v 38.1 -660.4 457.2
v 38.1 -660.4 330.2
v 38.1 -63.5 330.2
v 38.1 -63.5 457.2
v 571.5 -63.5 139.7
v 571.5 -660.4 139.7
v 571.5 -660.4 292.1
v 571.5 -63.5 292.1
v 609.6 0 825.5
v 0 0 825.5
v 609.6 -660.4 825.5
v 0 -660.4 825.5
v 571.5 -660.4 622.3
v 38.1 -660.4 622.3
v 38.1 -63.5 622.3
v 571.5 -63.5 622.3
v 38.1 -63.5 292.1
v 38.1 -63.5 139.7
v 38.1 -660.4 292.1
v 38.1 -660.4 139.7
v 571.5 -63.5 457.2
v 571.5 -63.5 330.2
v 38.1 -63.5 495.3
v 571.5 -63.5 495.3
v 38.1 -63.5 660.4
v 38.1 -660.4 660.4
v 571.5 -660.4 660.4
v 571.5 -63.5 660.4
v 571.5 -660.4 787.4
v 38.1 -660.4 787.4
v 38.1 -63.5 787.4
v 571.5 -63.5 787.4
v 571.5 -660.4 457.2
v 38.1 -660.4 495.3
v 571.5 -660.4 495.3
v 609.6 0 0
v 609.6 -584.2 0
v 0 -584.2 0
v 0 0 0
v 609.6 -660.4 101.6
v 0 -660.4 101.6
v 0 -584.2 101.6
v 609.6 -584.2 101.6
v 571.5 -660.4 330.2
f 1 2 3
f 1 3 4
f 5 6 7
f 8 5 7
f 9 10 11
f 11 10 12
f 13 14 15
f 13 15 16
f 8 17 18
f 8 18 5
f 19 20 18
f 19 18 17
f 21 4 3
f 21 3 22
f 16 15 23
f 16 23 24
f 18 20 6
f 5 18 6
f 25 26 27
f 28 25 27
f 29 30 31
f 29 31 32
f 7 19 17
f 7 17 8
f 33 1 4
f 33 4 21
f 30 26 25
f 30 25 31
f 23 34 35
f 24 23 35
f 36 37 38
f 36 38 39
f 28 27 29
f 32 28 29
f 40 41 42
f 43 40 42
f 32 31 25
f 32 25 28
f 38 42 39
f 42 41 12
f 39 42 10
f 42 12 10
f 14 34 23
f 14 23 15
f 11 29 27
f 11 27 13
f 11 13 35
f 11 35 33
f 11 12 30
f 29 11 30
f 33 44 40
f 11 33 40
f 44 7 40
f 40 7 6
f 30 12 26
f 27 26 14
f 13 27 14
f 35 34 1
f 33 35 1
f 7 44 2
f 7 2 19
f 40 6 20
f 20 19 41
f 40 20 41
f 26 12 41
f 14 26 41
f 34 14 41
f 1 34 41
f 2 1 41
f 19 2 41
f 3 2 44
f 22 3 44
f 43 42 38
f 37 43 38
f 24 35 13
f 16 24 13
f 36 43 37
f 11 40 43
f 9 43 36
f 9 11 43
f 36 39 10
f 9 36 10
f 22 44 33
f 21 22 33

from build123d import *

# Parameters (mm, degrees)
F1_DEPTH = 609.6
F2_W     = 533.4
F2_H     = 127
F2_H_2   = 152.4
F3_DEPTH = 596.9


# Not quite as in the source:
# - a feature names something its author has since deleted; it is built from what else it names


with BuildPart() as f1:
    # F0 (on Right) → F1 (new body)
    with BuildSketch(Plane.YZ):
        Polygon((-584.2, 0), (0, 0), (0, 825.5), (-660.4, 825.5), (-660.4, 101.6), (-584.2, 101.6), align=None)
    extrude(amount=F1_DEPTH)

    # F2 (on face) → F3 (cut)
    with BuildSketch(Plane.XZ.offset(660.4)):
        with Locations((304.8, 723.9)):
            Rectangle(F2_W, F2_H)
        with Locations((304.8, 558.8)):
            Rectangle(F2_W, F2_H)
        with Locations((304.8, 393.7)):
            Rectangle(F2_W, F2_H)
        with Locations((304.8, 215.9)):
            Rectangle(F2_W, F2_H_2)
    extrude(amount=-F3_DEPTH, mode=Mode.SUBTRACT)


solid = f1.part
